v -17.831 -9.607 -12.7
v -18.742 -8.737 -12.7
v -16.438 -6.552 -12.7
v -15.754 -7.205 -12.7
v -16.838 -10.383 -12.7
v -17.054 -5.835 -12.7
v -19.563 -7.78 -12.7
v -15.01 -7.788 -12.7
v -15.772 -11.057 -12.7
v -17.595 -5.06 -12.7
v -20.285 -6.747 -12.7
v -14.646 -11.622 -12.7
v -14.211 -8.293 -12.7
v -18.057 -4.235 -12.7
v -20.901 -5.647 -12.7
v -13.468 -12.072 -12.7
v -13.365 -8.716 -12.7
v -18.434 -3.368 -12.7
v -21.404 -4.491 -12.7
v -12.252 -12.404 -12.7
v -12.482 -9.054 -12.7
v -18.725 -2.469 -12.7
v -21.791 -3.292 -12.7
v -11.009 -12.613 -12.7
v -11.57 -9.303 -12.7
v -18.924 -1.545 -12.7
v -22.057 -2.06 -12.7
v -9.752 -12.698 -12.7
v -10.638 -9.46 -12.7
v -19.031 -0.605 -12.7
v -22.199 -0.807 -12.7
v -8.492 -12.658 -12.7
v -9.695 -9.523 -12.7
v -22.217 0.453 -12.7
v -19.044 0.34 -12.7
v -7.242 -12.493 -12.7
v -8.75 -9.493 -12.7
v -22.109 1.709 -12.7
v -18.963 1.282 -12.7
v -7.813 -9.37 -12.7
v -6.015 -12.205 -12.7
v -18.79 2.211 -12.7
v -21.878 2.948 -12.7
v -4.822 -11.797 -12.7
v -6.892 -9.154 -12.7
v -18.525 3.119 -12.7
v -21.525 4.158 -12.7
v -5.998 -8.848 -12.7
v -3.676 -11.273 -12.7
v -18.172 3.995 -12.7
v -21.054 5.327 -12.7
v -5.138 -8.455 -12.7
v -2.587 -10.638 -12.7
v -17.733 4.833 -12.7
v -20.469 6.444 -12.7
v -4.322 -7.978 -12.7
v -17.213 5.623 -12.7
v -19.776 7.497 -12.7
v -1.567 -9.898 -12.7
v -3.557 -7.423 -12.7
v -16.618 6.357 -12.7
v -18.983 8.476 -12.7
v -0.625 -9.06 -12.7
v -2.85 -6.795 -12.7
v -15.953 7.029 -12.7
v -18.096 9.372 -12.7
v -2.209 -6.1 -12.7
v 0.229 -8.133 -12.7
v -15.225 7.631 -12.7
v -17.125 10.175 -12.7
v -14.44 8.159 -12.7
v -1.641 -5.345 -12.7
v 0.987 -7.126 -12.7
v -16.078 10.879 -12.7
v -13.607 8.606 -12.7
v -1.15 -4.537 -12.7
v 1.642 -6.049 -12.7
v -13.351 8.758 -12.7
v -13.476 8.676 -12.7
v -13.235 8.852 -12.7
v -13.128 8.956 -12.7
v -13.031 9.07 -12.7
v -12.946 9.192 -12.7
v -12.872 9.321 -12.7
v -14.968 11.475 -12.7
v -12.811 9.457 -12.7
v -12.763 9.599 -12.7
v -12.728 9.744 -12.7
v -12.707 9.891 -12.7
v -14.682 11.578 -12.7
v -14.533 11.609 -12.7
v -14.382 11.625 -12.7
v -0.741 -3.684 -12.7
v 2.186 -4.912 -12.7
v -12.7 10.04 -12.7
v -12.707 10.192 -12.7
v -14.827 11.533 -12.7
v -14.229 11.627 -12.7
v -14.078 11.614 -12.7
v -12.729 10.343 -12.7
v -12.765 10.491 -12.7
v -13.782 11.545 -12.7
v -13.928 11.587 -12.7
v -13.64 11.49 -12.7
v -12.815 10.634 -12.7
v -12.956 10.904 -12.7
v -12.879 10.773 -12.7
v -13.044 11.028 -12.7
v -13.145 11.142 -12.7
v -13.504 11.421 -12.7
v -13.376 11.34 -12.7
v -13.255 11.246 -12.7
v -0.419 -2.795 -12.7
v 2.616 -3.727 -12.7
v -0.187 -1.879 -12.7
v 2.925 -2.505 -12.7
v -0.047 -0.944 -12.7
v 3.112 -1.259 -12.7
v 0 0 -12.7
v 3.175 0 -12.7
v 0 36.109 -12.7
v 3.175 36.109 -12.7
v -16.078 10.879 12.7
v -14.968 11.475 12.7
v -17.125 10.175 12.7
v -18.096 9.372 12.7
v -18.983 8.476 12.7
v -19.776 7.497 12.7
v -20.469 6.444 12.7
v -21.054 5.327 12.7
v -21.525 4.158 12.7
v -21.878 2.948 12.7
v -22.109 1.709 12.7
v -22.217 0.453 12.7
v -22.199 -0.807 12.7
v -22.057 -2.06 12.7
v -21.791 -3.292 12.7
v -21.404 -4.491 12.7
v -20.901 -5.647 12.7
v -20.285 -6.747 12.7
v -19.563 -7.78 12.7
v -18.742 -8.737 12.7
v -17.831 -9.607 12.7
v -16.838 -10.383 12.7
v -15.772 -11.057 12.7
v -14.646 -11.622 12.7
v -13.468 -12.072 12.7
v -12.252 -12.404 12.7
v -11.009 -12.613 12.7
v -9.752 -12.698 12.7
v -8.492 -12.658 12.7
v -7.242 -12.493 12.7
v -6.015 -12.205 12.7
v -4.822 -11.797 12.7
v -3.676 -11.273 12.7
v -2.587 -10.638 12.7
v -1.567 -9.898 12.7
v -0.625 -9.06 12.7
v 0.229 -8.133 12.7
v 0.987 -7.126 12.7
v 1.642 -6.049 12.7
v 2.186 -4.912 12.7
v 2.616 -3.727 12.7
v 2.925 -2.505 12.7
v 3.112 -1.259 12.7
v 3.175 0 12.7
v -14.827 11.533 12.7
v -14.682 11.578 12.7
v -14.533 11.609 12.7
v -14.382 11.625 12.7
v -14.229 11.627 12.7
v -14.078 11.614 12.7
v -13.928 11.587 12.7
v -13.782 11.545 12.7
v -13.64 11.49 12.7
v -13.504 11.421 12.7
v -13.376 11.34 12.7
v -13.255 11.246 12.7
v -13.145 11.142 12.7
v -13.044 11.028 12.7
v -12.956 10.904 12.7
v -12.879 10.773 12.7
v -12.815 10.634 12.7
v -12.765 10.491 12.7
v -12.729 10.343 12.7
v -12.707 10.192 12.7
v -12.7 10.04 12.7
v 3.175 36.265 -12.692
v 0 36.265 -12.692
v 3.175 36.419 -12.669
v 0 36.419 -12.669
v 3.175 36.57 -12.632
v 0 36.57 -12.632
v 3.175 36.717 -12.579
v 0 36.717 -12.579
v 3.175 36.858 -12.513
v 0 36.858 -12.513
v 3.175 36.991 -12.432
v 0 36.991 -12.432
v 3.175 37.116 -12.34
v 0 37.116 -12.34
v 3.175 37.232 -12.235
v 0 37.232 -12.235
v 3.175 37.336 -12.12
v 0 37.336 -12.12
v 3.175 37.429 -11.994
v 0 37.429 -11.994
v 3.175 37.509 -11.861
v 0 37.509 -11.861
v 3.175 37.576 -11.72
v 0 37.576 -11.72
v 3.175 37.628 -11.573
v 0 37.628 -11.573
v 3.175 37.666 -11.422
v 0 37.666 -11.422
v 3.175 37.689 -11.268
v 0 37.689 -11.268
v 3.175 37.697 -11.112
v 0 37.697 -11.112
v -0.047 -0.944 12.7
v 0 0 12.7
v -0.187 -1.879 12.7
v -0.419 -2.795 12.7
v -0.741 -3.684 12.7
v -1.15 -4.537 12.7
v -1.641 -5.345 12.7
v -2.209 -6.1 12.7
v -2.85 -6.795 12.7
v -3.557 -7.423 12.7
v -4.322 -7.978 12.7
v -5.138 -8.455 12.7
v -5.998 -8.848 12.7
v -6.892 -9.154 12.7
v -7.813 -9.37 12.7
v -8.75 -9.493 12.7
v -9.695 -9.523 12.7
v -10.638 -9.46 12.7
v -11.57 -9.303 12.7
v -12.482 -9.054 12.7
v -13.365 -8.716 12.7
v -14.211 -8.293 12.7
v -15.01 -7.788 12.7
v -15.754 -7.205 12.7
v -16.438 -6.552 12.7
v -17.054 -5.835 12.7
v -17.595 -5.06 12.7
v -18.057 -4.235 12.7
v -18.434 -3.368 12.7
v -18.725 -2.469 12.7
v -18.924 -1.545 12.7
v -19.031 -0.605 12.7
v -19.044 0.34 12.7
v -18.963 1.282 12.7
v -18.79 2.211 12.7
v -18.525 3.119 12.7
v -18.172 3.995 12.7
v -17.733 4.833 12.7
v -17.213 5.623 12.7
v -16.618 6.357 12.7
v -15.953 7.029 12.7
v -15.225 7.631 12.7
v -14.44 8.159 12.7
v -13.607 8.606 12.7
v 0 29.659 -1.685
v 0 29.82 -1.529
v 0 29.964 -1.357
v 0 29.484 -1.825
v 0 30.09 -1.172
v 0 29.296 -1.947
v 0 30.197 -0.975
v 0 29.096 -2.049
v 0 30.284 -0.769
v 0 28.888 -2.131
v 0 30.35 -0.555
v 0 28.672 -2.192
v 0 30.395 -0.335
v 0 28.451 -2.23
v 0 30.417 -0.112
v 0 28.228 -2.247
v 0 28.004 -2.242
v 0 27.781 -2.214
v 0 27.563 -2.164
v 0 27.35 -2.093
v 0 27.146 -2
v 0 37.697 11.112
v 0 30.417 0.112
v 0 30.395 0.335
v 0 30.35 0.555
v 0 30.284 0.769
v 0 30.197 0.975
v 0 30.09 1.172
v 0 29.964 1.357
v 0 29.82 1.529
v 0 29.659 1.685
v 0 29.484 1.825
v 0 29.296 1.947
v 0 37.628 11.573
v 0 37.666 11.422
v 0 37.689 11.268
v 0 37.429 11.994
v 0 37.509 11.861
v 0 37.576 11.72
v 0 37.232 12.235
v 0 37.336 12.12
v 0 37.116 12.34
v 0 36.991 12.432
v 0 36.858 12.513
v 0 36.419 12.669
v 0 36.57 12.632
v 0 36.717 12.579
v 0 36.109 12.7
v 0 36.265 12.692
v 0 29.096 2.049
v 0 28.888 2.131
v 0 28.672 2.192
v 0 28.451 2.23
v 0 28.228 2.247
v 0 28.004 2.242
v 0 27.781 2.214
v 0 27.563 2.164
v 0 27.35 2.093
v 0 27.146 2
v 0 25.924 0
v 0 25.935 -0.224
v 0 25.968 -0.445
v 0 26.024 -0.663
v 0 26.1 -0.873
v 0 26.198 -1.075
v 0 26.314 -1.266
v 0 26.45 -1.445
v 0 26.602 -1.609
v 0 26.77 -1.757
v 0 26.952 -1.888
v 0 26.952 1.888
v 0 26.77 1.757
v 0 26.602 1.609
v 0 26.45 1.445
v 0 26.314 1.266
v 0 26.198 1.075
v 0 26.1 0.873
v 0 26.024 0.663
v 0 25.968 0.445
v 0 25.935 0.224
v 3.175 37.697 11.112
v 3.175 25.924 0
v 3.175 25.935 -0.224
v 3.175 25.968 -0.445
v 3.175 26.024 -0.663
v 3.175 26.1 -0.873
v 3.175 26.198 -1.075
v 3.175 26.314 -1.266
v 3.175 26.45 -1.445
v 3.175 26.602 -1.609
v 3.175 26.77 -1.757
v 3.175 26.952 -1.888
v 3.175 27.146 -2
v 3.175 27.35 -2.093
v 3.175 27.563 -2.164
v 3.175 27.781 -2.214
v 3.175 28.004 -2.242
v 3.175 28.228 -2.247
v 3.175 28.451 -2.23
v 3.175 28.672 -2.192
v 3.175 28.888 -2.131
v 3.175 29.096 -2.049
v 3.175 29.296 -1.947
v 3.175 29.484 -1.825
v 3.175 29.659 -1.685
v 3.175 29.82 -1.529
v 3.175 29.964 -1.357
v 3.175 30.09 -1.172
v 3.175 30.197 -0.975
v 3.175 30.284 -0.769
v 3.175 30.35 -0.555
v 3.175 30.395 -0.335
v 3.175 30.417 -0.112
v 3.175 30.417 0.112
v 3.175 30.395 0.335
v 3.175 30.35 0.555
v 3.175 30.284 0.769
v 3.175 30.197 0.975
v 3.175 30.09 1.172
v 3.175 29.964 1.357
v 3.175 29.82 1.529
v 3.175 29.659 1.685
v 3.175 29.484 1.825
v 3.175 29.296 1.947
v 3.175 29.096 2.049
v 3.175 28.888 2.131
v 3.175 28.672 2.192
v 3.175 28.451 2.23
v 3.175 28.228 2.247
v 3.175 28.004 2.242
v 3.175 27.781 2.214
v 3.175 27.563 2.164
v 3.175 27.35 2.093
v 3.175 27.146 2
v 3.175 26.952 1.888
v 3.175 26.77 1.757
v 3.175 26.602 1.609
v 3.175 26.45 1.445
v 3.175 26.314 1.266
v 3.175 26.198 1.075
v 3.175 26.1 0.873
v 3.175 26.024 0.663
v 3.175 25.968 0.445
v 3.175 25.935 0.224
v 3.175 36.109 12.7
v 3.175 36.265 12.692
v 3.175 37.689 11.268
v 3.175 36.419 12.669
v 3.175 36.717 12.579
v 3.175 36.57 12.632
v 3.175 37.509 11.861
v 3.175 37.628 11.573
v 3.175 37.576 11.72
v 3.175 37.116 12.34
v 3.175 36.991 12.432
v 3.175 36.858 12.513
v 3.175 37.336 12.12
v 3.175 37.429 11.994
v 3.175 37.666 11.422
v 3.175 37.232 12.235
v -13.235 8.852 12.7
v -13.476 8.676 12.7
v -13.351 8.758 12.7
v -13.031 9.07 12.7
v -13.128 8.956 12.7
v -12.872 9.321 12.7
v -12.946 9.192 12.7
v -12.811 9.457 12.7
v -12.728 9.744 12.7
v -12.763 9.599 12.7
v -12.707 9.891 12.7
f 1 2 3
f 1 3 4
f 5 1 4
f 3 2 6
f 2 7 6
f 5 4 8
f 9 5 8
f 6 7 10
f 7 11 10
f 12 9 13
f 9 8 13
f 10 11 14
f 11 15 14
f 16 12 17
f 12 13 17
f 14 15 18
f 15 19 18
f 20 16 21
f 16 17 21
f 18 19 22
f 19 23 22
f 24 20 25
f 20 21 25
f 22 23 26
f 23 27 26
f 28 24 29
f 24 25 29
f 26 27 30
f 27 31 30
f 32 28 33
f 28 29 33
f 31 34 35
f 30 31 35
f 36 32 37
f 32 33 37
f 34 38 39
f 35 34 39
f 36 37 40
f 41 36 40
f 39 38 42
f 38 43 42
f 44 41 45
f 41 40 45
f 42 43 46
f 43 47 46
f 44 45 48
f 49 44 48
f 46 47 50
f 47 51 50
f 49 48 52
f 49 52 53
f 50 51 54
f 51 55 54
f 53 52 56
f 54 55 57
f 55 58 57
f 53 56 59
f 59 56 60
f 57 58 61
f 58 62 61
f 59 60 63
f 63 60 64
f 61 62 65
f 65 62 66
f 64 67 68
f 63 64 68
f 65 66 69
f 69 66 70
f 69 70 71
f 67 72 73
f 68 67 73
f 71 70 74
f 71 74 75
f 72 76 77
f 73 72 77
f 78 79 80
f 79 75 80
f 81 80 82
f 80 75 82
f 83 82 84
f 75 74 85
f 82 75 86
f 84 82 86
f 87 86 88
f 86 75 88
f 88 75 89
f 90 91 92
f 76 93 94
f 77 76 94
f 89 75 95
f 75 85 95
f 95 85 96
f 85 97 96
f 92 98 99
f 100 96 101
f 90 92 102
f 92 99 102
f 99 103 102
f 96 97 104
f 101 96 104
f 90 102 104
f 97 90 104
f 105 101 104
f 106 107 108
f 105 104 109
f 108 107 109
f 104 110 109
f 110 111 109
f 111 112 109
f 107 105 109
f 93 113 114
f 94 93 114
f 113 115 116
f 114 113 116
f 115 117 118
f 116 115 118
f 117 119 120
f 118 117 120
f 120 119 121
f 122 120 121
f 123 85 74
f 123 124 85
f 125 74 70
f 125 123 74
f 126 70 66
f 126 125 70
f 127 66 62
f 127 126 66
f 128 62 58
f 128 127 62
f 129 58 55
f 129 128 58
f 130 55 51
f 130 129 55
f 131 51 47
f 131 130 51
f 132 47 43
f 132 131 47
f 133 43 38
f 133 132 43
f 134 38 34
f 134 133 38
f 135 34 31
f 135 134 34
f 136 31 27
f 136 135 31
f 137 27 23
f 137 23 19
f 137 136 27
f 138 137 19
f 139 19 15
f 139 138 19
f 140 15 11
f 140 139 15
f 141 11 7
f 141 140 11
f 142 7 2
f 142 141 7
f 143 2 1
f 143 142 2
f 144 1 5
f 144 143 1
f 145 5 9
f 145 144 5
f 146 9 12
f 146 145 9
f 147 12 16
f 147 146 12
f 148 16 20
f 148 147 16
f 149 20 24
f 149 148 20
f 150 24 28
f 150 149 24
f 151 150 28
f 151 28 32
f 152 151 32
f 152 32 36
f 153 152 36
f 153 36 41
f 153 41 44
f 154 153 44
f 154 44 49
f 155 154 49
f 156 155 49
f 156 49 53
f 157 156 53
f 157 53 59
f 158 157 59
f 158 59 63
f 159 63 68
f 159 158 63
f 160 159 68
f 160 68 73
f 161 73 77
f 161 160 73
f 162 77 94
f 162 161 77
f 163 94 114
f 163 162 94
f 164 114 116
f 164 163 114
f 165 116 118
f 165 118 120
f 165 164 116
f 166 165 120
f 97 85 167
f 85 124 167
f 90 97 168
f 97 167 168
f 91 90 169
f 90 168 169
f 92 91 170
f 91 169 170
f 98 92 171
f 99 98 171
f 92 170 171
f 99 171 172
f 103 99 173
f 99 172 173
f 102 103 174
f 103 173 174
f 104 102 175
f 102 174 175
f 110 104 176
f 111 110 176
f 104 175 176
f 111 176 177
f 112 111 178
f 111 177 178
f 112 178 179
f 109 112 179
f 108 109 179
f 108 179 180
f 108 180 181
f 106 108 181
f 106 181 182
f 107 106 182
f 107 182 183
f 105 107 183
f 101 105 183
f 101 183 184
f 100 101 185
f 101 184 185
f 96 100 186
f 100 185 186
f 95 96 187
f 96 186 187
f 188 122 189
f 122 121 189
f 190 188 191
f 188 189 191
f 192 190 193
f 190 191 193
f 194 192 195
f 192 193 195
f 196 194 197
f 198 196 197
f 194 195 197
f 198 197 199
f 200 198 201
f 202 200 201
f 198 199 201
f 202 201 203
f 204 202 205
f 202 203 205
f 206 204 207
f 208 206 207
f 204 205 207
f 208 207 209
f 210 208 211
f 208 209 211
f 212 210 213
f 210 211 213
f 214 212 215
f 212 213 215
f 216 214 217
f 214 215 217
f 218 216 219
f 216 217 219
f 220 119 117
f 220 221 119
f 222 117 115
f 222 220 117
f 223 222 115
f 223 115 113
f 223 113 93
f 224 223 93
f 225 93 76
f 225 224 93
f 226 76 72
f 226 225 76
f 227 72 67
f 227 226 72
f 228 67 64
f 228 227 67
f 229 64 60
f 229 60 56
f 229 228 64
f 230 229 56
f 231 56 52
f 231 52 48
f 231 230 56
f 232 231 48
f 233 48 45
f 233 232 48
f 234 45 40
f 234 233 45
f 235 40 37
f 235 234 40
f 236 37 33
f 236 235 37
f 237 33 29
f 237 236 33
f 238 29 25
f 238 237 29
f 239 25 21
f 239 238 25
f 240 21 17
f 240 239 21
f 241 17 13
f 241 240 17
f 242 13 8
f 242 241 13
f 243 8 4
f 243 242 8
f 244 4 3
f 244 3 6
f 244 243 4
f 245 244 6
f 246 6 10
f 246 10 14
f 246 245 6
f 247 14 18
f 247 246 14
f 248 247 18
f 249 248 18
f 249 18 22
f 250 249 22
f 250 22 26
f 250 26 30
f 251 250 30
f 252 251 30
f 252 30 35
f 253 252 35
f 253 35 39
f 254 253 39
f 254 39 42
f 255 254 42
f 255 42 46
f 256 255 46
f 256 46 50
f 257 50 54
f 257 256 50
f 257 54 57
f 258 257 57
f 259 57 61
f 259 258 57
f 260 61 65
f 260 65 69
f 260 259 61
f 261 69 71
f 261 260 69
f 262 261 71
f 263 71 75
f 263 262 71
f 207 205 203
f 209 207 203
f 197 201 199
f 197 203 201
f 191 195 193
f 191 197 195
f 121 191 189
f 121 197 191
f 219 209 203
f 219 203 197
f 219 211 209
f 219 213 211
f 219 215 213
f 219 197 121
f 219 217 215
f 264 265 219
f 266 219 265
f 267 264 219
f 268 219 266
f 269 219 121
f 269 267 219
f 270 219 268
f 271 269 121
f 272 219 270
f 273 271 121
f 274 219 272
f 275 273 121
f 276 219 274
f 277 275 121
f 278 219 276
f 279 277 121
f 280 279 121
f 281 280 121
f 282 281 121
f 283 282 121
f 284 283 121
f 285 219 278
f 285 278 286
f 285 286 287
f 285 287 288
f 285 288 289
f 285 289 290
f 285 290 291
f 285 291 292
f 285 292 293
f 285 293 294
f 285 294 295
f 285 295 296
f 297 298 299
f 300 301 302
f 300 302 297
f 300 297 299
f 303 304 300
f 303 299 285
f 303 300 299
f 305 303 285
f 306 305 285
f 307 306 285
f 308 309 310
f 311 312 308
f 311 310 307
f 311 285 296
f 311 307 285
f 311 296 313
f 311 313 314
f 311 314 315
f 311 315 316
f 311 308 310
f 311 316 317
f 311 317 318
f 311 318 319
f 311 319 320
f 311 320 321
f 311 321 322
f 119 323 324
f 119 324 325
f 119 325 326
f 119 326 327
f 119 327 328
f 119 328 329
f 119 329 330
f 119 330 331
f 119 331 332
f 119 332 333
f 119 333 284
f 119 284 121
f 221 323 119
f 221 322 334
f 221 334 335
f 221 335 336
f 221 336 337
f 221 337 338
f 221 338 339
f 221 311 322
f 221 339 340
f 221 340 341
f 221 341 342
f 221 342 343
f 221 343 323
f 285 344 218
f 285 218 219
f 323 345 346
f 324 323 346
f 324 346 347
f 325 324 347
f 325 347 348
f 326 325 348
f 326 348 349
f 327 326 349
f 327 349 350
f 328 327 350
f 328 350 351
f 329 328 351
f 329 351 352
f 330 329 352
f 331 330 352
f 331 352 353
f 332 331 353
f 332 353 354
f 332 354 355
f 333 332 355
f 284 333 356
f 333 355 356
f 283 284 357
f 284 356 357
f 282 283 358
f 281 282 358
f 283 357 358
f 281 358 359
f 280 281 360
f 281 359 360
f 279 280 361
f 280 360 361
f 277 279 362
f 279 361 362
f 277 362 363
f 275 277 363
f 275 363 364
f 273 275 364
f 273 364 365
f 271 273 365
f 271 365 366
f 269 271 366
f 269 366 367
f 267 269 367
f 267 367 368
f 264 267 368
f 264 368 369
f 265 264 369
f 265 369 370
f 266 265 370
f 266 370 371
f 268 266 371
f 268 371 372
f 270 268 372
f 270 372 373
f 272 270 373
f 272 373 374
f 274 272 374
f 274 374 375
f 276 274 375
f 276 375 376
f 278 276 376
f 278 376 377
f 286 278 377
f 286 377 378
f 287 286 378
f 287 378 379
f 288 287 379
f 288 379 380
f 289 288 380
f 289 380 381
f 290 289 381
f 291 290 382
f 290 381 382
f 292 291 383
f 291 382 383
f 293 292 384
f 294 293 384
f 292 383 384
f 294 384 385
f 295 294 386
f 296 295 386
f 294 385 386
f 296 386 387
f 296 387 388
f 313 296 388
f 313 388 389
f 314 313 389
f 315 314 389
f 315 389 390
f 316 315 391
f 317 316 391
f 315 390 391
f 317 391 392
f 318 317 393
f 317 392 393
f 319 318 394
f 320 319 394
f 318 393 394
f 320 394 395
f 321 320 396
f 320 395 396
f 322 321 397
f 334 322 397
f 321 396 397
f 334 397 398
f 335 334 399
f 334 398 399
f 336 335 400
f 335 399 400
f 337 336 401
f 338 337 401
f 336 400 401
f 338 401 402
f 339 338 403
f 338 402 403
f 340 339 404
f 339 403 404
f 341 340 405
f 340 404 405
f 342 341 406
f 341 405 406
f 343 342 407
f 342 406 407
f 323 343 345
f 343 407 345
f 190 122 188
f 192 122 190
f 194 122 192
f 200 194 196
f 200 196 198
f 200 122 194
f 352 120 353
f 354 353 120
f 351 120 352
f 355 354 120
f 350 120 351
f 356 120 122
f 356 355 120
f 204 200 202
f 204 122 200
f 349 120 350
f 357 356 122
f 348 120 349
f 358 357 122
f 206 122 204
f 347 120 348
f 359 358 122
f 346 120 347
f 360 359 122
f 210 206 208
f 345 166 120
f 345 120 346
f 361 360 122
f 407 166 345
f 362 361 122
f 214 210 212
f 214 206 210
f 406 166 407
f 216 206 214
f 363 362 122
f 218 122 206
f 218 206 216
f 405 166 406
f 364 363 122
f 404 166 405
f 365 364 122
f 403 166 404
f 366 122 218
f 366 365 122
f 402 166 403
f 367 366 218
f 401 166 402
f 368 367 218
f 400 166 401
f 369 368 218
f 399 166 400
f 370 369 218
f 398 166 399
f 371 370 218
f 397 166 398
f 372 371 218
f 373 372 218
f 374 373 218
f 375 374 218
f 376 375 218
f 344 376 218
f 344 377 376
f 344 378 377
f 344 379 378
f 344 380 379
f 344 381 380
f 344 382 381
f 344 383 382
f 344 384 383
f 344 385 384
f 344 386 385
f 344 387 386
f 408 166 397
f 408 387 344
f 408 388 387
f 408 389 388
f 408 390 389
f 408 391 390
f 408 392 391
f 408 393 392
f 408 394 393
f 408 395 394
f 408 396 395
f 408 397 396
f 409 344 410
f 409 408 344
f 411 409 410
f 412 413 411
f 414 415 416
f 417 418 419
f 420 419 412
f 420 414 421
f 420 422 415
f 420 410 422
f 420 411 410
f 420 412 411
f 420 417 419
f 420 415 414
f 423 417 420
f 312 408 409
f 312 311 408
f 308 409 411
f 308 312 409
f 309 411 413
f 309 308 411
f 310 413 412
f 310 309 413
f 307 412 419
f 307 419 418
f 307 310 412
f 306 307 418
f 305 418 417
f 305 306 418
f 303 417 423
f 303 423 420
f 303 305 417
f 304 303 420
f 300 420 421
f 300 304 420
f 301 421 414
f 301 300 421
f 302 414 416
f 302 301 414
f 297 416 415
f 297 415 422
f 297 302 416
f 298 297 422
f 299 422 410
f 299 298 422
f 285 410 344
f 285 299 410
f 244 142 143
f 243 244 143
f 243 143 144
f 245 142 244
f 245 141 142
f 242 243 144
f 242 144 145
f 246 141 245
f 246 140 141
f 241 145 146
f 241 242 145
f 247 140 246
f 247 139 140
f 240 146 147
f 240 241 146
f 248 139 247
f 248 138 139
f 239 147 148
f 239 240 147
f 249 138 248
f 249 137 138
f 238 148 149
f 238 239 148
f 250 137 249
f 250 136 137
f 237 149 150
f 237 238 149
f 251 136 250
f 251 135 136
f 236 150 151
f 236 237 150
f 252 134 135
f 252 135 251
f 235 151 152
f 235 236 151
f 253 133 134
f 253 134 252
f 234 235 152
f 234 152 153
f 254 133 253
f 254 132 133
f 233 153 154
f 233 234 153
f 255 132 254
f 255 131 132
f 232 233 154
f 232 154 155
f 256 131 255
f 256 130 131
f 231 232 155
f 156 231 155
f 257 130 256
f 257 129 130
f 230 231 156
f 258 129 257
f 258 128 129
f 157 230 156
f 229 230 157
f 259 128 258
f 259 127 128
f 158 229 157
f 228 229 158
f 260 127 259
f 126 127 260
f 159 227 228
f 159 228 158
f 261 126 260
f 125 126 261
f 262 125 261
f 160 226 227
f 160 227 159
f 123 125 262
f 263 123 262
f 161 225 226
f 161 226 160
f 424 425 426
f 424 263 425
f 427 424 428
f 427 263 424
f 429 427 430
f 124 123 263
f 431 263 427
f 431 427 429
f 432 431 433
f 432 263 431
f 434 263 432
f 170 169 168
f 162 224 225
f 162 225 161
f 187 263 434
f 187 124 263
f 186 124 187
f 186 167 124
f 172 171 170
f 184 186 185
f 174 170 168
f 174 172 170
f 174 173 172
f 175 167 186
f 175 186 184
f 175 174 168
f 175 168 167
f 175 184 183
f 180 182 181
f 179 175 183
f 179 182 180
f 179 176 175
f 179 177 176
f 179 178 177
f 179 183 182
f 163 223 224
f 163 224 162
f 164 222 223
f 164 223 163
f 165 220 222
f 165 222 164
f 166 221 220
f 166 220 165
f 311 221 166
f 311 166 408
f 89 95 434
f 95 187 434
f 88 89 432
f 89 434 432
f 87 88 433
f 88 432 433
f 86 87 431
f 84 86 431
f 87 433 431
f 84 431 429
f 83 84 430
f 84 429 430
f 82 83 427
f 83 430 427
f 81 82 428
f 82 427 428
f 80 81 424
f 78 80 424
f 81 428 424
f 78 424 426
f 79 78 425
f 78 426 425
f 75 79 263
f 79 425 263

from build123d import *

# Parameters (mm, degrees)
F1_DEPTH = 12.7
F2_R     = 1.58749
F3_R     = 1.5875
F5_D     = 4.4958


# Not quite as in the source:
# - a fillet or chamfer is up to 0.001 mm smaller than in the source, because OpenCascade refuses the exact size


with BuildPart() as f1:
    # F0 (on Top) → F1 (new body, symmetric)
    with BuildSketch(Plane.XY):
        with BuildLine():
            Line((0, 37.6967221242), (0, 0))
            ThreePointArc((0, 0), (-15.024261314, -7.7771299333), (-12.7, 8.9802561211))
            Line((-12.7, 8.9802561211), (-12.7, 12.2967221242))
            ThreePointArc((-12.7, 12.2967221242), (-17.3021299333, -10.040231571), (3.175, 0))
            Line((3.175, 0), (3.175, 37.6967221242))
            Line((3.175, 37.6967221242), (0, 37.6967221242))
        make_face()
    extrude(amount=F1_DEPTH, both=True)

    # F2 (radius 1.5875 in the source; OpenCascade refuses exactly that, so slightly less here)
    f2_edges = [f1.edges().sort_by_distance(p)[0] for p in [
        (-12.7, 8.980256, 0),
        (-12.7, 12.296722, 0),
    ]]
    fillet(f2_edges, radius=F2_R)

    # F3
    f3_edges = [f1.edges().sort_by_distance(p)[0] for p in [
        (1.5875, 37.696722, 12.7),
        (1.5875, 37.696722, -12.7),
    ]]
    fillet(f3_edges, radius=F3_R)

    # F5 (through all)
    with Locations(Plane(origin=(0, 0, 0), x_dir=(0, 1, 0), z_dir=(-1, 0, 0))):
        with Locations((28.1717221242, 0)):
            Hole(F5_D / 2)


solid = f1.part
